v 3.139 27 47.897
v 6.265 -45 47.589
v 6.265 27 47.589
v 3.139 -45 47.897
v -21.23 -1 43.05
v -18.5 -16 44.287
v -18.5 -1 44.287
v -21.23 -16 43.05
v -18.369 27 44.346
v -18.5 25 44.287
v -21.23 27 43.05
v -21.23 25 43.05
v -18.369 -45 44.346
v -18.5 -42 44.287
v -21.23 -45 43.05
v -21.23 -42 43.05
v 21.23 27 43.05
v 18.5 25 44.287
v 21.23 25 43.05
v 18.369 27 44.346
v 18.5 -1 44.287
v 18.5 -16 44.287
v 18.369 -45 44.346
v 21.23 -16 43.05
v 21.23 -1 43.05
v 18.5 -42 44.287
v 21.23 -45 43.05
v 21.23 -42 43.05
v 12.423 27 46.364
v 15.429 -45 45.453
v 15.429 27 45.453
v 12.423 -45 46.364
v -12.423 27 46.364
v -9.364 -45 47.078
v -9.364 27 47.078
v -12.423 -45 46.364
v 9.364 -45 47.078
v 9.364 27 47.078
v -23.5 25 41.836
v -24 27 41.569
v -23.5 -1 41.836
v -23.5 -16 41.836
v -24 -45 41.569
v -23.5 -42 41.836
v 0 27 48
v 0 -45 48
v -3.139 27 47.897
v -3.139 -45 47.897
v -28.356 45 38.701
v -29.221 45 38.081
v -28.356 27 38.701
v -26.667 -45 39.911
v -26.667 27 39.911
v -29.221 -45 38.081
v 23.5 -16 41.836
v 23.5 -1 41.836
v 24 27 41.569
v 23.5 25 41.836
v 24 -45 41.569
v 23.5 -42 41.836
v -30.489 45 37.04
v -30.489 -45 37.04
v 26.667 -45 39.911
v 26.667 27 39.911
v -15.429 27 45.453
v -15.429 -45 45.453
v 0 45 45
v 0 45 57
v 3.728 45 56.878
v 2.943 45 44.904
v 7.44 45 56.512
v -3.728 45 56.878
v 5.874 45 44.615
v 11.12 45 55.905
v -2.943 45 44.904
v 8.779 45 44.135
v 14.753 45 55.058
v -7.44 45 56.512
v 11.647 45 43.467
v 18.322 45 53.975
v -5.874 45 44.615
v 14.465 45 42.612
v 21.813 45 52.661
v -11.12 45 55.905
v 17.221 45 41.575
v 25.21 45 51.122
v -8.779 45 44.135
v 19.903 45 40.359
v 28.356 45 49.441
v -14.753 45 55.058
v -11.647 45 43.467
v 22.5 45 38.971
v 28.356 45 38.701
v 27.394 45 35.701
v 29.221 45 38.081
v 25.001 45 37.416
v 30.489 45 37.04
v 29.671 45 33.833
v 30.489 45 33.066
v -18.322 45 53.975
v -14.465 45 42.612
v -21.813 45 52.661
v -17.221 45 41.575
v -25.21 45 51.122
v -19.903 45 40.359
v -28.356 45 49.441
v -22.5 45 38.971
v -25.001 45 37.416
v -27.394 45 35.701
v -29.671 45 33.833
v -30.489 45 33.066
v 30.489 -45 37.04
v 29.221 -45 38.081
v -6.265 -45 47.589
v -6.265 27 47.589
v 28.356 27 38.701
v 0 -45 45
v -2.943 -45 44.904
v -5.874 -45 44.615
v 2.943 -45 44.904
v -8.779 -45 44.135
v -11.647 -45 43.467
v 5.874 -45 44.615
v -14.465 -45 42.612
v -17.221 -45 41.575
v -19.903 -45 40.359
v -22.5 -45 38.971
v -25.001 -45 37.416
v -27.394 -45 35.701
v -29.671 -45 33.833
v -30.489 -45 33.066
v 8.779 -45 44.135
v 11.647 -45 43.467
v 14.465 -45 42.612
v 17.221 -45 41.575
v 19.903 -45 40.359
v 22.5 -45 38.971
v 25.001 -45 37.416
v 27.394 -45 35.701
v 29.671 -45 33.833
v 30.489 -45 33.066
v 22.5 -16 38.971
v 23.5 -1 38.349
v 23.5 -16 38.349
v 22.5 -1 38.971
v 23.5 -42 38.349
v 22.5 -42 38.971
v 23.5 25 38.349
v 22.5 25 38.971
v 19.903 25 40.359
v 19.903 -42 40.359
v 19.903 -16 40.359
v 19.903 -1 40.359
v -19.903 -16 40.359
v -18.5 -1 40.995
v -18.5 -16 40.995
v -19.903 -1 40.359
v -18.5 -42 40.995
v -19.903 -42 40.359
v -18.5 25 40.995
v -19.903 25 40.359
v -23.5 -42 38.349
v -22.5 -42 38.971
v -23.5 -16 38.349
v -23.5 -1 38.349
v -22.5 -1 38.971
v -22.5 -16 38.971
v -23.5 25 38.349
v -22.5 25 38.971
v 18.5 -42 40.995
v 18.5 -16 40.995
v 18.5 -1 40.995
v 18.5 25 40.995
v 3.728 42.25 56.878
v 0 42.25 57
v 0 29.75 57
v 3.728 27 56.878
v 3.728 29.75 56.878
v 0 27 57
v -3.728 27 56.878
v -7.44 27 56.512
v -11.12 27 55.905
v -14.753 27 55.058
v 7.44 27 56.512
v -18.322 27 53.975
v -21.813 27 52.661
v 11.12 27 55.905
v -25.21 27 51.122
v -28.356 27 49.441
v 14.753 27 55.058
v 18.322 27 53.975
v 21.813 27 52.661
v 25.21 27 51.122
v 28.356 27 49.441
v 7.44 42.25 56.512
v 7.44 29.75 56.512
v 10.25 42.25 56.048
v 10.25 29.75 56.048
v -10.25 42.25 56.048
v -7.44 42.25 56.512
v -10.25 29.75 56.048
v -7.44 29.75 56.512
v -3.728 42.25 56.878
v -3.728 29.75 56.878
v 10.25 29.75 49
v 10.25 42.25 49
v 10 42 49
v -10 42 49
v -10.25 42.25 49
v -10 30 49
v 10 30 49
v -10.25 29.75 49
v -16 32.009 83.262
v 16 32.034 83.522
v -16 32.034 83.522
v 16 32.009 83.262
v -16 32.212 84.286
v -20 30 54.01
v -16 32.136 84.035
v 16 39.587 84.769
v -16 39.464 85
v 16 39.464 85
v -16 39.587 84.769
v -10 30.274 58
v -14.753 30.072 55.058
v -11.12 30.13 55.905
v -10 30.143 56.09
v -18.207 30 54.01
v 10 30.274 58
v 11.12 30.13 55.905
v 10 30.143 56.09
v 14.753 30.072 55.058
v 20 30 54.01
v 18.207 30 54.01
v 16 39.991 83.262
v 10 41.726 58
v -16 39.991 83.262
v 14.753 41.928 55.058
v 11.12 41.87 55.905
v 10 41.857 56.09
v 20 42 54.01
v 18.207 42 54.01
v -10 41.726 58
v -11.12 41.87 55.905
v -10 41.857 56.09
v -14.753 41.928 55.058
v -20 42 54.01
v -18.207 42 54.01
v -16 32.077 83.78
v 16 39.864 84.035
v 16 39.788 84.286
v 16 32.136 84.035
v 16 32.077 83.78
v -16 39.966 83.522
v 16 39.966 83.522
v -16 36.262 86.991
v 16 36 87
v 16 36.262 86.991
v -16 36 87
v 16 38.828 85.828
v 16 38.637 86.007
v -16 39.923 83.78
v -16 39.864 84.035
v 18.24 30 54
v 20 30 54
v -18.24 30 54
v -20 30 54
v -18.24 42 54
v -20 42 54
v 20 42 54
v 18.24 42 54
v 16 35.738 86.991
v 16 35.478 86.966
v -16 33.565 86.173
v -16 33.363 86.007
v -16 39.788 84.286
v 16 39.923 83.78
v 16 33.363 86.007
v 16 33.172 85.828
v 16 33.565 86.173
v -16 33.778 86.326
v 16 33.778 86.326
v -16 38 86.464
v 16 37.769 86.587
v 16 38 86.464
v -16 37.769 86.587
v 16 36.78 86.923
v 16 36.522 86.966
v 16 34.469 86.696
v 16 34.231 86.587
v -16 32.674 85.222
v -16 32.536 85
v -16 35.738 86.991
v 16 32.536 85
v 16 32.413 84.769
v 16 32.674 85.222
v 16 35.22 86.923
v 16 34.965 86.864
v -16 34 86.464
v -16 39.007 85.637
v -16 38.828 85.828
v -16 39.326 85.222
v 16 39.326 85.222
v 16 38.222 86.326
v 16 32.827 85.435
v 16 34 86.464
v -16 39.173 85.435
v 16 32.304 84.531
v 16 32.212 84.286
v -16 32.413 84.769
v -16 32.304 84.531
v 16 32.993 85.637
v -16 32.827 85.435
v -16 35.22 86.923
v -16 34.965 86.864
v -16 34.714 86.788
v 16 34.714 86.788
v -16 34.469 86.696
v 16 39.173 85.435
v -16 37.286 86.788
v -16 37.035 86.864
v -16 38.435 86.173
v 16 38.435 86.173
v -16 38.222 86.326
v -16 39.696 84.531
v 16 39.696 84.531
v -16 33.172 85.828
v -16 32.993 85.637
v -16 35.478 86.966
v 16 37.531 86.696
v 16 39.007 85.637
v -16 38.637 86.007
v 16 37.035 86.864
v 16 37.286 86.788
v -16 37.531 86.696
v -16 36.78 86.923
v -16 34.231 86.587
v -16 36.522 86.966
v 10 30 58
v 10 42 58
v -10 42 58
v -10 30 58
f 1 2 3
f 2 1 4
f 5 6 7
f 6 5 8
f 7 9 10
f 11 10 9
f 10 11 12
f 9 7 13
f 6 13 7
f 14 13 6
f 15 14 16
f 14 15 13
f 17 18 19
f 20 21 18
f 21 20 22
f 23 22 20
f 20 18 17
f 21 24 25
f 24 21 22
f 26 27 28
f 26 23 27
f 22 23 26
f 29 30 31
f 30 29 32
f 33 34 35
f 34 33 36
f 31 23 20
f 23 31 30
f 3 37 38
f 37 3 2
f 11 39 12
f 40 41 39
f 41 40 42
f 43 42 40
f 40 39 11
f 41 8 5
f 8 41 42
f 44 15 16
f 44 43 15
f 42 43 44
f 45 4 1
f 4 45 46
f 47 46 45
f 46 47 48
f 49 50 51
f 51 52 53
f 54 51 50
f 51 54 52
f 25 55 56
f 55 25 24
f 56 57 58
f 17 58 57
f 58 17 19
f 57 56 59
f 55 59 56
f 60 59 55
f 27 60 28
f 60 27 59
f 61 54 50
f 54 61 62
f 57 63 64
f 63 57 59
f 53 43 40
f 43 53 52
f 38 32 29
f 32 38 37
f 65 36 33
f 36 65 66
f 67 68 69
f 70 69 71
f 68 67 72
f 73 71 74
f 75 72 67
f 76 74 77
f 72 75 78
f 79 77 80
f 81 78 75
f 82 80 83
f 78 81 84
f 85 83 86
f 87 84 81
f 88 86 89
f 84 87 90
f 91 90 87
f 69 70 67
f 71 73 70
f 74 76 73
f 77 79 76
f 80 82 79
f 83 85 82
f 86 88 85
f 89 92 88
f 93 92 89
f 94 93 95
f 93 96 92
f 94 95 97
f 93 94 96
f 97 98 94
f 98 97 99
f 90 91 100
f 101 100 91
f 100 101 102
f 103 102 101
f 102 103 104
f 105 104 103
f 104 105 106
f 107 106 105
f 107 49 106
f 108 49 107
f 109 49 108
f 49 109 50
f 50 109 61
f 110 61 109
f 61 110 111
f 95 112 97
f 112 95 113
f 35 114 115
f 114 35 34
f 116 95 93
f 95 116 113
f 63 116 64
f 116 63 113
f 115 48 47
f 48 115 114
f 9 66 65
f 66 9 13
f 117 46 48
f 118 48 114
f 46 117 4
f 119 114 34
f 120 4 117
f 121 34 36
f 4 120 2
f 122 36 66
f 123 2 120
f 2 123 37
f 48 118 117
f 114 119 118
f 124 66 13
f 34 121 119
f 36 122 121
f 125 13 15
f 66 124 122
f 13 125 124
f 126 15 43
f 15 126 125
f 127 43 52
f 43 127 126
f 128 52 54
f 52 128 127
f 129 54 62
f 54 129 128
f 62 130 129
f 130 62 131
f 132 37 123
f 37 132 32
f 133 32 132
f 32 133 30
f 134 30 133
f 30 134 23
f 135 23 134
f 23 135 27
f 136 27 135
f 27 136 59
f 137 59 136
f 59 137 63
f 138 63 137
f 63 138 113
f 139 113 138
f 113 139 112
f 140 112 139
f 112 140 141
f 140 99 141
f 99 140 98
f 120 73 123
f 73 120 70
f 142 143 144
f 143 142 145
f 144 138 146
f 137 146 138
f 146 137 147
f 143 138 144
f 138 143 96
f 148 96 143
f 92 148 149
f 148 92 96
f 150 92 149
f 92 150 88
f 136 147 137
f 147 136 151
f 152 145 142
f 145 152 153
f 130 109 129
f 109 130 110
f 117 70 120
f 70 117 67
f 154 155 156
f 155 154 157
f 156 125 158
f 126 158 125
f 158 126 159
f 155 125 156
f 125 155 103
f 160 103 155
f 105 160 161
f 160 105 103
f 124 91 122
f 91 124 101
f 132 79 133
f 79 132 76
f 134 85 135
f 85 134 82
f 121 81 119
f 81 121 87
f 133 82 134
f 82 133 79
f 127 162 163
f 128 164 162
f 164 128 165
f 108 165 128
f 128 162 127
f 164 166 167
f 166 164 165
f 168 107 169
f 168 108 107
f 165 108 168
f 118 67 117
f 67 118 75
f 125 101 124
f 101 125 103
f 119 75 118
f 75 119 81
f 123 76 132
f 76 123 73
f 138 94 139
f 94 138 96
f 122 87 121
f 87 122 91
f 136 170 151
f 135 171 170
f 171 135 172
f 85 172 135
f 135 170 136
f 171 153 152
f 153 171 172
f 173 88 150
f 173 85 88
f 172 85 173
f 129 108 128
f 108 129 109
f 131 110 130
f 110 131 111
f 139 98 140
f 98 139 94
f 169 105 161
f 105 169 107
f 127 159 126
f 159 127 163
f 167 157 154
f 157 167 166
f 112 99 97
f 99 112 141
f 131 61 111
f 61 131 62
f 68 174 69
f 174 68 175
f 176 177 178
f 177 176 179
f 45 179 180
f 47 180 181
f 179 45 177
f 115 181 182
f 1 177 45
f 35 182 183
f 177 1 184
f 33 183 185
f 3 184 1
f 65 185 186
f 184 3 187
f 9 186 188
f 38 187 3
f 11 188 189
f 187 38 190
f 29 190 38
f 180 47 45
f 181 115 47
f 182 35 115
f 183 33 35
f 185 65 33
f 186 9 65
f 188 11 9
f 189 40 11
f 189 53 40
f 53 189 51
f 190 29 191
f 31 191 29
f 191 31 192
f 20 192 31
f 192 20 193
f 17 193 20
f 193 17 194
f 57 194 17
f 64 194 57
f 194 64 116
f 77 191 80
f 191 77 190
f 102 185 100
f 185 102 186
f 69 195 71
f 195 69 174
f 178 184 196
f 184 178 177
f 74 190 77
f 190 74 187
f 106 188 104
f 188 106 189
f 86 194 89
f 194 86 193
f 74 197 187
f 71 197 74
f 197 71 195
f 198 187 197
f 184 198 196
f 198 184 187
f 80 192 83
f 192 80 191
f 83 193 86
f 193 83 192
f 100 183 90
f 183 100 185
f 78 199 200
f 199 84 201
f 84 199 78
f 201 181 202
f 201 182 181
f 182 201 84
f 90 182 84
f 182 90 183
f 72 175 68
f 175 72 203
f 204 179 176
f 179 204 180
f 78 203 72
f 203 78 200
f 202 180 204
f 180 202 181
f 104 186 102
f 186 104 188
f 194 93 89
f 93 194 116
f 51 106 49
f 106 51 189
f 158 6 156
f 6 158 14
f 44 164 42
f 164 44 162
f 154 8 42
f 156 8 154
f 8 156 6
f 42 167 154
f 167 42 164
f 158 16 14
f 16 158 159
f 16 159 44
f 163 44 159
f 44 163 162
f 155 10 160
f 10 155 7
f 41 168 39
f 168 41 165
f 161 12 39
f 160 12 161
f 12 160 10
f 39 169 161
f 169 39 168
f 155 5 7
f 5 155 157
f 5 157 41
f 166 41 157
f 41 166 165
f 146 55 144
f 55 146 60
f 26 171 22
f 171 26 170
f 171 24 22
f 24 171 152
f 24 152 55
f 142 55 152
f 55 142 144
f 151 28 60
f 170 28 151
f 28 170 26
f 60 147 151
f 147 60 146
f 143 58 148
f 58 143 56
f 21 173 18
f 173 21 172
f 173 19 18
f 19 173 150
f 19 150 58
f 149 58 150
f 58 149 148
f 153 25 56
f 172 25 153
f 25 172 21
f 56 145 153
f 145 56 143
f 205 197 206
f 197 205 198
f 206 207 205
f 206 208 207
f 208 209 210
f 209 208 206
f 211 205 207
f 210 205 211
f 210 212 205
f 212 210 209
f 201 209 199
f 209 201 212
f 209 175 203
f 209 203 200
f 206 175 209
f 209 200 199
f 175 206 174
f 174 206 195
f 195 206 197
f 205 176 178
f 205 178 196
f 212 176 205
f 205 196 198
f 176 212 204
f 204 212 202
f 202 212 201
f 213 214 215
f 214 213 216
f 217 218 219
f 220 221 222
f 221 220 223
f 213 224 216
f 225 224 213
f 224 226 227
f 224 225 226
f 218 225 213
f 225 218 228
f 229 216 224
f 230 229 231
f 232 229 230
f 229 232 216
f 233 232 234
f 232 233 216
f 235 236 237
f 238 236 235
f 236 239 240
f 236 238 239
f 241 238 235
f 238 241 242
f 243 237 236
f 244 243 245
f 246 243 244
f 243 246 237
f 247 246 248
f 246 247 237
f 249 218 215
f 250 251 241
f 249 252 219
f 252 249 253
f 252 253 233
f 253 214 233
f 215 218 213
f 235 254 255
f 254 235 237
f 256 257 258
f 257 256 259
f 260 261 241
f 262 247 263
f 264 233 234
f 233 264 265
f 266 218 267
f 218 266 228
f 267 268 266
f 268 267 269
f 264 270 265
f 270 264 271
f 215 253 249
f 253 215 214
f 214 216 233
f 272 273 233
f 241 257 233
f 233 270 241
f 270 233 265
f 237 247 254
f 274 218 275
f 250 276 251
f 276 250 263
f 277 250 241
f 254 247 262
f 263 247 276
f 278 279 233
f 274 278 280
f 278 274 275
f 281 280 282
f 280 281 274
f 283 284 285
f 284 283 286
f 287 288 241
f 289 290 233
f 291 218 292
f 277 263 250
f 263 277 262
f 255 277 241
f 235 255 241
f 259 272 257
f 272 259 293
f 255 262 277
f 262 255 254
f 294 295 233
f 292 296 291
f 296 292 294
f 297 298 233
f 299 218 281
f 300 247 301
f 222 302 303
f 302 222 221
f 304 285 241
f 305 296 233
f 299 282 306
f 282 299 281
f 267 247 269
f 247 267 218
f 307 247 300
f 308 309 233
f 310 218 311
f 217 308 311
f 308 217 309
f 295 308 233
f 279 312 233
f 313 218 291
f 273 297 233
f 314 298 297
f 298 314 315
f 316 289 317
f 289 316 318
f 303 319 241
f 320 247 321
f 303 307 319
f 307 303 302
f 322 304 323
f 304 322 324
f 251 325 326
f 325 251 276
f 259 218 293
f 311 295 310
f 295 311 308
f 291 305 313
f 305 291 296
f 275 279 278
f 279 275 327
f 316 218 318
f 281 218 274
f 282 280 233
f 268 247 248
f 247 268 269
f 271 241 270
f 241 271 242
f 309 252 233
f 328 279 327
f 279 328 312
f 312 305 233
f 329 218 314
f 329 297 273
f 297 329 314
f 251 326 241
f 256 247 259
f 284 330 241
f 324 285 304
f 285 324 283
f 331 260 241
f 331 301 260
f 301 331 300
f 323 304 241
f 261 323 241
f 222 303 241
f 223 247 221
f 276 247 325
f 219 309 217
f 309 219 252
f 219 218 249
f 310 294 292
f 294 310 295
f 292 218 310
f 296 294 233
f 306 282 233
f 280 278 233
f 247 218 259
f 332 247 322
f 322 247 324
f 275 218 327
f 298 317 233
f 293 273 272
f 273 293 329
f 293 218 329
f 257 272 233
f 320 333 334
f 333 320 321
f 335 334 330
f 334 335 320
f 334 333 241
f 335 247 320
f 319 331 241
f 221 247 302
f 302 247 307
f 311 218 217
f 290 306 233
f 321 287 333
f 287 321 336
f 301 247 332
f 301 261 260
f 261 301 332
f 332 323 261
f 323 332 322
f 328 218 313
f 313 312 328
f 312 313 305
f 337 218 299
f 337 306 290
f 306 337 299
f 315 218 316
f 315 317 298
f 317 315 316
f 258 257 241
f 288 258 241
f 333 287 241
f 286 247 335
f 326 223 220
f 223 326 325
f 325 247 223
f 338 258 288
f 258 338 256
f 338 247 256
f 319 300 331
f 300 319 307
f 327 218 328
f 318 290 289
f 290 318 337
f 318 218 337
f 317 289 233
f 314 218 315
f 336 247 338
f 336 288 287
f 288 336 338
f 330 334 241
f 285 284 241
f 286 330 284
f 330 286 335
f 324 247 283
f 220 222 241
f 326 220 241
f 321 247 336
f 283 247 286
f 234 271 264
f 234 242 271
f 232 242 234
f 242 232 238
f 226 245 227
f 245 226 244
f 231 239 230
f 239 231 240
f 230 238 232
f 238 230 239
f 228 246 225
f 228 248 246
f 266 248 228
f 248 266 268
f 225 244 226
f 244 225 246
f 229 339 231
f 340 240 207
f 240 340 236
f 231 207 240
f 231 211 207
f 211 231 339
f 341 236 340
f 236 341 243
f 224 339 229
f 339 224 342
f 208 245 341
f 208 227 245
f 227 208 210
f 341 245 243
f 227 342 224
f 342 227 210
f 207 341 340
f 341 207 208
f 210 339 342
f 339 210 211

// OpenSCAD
// Elbow Target: a tactile cue for the bent-elbow ("yo-yo") release.
//
// A curved saddle straps to the INSIDE of the forearm just below the elbow crease. A bumper of
// chosen height stands on it, facing the crease. When the elbow bends to the target angle at the
// bottom of the swing, the upper arm meets the bumper: you feel it, then uncoil out of it.
// No hinge to align, no spring. The bumper plugs into the saddle with a press-fit tenon; the arm's
// contact pushes it further in, never out. Adjust the angle with the bumper height and by sliding
// the saddle along the forearm (closer to the crease = contact at a tighter bend).
//
//   openscad -o saddle.stl  -D 'part="saddle"'  elbow_target.scad    (print standing on its block end, no supports)
//   openscad -o bumpers.stl -D 'part="bumpers"' elbow_target.scad    (four heights lying on their backs, no supports)
//   openscad -o strap.stl   -D 'part="strap"'   elbow_target.scad    (TPU 95A, flat; print two. Or use 25 mm velcro)
// Set forearm_d to the forearm diameter just below the elbow: circumference in mm / 3.14.

part = "all";            // [saddle, bumpers, strap, all]
forearm_d = 90;          // forearm diameter just below the elbow crease (circumference / 3.14)
saddle_len = 90;         // along the arm
saddle_w = 56;           // across the arm (chord)
saddle_t = 3;
block_len = 18;          // the thicker block at the elbow end that holds the bumper
block_h = 12;            // its height above the arm
block_w = 44;
tenon = [20, 12, 8];     // bumper tenon: across the arm, along the arm, depth into the block
clear = 0.25;            // mortise clearance per side (press fit; sand the tenon if tight)
strap_w = 25; strap_t = 3.5;             // strap slot size (25 mm velcro, or the printed TPU strap)
bumper_heights = [10, 20, 30, 40];       // above the block
bumper_w = 40; bumper_th = 12;
eps = 0.01;
$fn = 96;

Ri = forearm_d / 2;
y_block = saddle_len / 2 - block_len / 2;             // bumper position along the arm
y_strap = [-(saddle_len / 2 - 16), saddle_len / 2 - block_len - 15];

// A section of the arm cylinder (axis y, crown at +z): radii Ri..Ri+h, chord width w, y0..y1
module shell(h, w, y0, y1) {
    a = asin((w / 2) / Ri);
    intersection() {
        rotate([-90, 0, 0]) translate([0, 0, y0]) difference() {
            cylinder(r = Ri + h, h = y1 - y0);
            translate([0, 0, -1]) cylinder(r = Ri, h = y1 - y0 + 2);
        }
        translate([-(Ri + h + 1) * sin(a), y0 - 1, 0]) cube([2 * (Ri + h + 1) * sin(a), y1 - y0 + 2, Ri + h + 2]);
    }
}

module saddle() {
    difference() {
        union() {
            shell(saddle_t, saddle_w, -saddle_len / 2, saddle_len / 2);
            shell(block_h, block_w, saddle_len / 2 - block_len, saddle_len / 2);
        }
        // mortise for the bumper's tenon, cut down from the block's crown
        translate([-(tenon[0] / 2 + clear), y_block - tenon[1] / 2 - clear, Ri + block_h - tenon[2]])
            cube([tenon[0] + 2 * clear, tenon[1] + 2 * clear, tenon[2] + 2]);
        // strap slots along both edges, two positions
        for (sx = [-1, 1], y = y_strap)
            translate([sx * (saddle_w / 2 - 7) - 2.5, y - strap_w / 2 - 0.5, -1]) cube([5, strap_w + 1, Ri + saddle_t + 2]);
    }
}

// A bumper of height h above the block: rounded top, concave underside that sits on the block's crown,
// tenon below. Its +y face is the contact face (toward the elbow crease).
module bumper(h) {
    union() {
        difference() {
            hull() {
                translate([-bumper_w / 2, -bumper_th / 2, -3]) cube([bumper_w, bumper_th, eps]);
                translate([-bumper_w / 2 + 4, 0, h - 4]) rotate([0, 90, 0]) cylinder(r = 4, h = bumper_w - 8);
            }
            // the block's crown, so the bumper seats on it without a gap at its edges
            translate([0, 0, -(Ri + block_h)]) rotate([-90, 0, 0]) cylinder(r = Ri + block_h, h = 40, center = true);
        }
        translate([-tenon[0] / 2, -tenon[1] / 2, -tenon[2]]) cube([tenon[0], tenon[1], tenon[2] + 1]);
    }
}

// Bumpers in print orientation: lying on their backs (the -y face), tenons pointing +y... i.e. flat on the bed
module bumpers_flat() {
    for (i = [0 : len(bumper_heights) - 1])
        translate([i * (bumper_w + 8), 0, bumper_th / 2]) rotate([90, 0, 0]) bumper(bumper_heights[i]);
}

// Printed TPU strap: a 25 mm band round the forearm with a peg at one end and a row of holes at the other
module strap() {
    L = PI * forearm_d + 80;
    t = 1.8;
    difference() {
        hull() { for (x = [strap_w / 2, L - strap_w / 2]) translate([x, 0, 0]) cylinder(r = strap_w / 2, h = t); }
        for (x = [L - 20 : -12 : L - 130]) translate([x, 0, -1]) cylinder(d = 6, h = t + 2);
    }
    translate([14, 0, t - eps]) { cylinder(d = 5.5, h = 3); translate([0, 0, 3]) cylinder(d1 = 9, d2 = 7, h = 1.6); }
}

module saddle_standing() { translate([0, 0, saddle_len / 2]) rotate([-90, 0, 0]) saddle(); }   // block end on the bed

if (part == "saddle")  saddle_standing();
if (part == "bumpers") bumpers_flat();
if (part == "strap")   strap();
if (part == "all") {
    saddle();
    translate([0, y_block, Ri + block_h]) bumper(bumper_heights[2]);   // the 30 mm bumper in place, for the picture
}
